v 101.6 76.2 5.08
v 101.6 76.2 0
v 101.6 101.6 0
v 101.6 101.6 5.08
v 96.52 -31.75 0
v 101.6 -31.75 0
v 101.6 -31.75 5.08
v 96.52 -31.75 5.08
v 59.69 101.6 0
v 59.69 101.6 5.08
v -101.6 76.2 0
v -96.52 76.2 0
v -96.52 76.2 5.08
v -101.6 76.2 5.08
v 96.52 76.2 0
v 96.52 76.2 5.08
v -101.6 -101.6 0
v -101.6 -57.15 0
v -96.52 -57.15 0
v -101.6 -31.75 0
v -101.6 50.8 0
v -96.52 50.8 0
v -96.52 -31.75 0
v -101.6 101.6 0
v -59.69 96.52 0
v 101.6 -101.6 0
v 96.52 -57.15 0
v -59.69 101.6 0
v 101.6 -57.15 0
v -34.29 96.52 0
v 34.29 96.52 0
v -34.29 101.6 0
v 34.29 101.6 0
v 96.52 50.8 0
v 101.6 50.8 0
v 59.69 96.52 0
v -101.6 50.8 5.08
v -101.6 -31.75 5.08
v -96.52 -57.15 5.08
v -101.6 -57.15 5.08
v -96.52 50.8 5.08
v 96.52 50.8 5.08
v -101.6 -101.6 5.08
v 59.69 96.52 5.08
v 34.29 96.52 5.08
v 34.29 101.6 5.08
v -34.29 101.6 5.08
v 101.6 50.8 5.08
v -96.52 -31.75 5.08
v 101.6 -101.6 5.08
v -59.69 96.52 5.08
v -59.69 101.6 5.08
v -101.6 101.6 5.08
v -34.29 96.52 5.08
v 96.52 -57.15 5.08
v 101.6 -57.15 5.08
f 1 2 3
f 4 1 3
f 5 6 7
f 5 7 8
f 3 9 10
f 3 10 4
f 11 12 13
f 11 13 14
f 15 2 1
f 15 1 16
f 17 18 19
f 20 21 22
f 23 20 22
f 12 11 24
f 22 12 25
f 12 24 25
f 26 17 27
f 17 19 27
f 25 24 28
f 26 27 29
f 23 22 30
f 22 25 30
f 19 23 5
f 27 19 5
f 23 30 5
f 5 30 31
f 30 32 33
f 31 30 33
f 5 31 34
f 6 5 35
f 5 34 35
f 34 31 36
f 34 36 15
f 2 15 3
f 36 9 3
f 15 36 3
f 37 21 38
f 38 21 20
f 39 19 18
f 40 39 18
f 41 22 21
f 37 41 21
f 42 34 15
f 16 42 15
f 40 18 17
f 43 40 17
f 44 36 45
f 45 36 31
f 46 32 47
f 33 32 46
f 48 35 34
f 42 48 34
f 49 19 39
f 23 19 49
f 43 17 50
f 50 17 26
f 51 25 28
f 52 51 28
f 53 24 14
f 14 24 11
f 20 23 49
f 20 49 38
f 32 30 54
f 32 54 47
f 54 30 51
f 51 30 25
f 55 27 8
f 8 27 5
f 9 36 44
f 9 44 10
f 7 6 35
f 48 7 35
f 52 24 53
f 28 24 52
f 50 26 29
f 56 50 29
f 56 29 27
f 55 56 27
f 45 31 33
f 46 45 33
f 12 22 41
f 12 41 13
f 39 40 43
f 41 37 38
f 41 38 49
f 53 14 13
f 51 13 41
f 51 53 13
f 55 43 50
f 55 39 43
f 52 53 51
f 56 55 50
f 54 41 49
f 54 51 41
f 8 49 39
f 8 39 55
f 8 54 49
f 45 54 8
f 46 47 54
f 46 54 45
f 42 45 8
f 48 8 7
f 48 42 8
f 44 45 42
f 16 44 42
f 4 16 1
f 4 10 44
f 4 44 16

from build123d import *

# Parameters (mm, degrees)
SKETCH1_W           = 203.2
SKETCH1_H           = 101.6
BOSS_EXTRUDE1_DEPTH = 5.08
SKETCH2_W           = 5.08
SKETCH2_H           = 25.4
SKETCH2_W_2         = 25.4
SKETCH2_H_2         = 5.08
CUT_EXTRUDE1_DEPTH  = 5.08


with BuildPart() as part:
    # Sketch1 → Boss-Extrude1 (new body)
    with BuildSketch(Plane.XY):
        with Locations((0, 50.8)):
            Rectangle(SKETCH1_W, SKETCH1_H)
        with Locations((0, -50.8)):
            Rectangle(SKETCH1_W, SKETCH1_H)
    extrude(amount=BOSS_EXTRUDE1_DEPTH)

    # Sketch2 → Cut-Extrude1 (cut)
    with BuildSketch(Plane(origin=(0, 0, 0), x_dir=(-1, 0, 0), z_dir=(0, 0, -1))):
        with Locations((-99.06, -44.45)):
            Rectangle(SKETCH2_W, SKETCH2_H)
        with Locations((99.06, -44.45)):
            Rectangle(SKETCH2_W, SKETCH2_H)
        with Locations((99.06, 63.5)):
            Rectangle(SKETCH2_W, SKETCH2_H)
        with Locations((46.99, 99.06)):
            Rectangle(SKETCH2_W_2, SKETCH2_H_2)
        with Locations((-46.99, 99.06)):
            Rectangle(SKETCH2_W_2, SKETCH2_H_2)
        with Locations((-99.06, 63.5)):
            Rectangle(SKETCH2_W, SKETCH2_H)
    extrude(amount=-CUT_EXTRUDE1_DEPTH, mode=Mode.SUBTRACT)


solid = part.part
